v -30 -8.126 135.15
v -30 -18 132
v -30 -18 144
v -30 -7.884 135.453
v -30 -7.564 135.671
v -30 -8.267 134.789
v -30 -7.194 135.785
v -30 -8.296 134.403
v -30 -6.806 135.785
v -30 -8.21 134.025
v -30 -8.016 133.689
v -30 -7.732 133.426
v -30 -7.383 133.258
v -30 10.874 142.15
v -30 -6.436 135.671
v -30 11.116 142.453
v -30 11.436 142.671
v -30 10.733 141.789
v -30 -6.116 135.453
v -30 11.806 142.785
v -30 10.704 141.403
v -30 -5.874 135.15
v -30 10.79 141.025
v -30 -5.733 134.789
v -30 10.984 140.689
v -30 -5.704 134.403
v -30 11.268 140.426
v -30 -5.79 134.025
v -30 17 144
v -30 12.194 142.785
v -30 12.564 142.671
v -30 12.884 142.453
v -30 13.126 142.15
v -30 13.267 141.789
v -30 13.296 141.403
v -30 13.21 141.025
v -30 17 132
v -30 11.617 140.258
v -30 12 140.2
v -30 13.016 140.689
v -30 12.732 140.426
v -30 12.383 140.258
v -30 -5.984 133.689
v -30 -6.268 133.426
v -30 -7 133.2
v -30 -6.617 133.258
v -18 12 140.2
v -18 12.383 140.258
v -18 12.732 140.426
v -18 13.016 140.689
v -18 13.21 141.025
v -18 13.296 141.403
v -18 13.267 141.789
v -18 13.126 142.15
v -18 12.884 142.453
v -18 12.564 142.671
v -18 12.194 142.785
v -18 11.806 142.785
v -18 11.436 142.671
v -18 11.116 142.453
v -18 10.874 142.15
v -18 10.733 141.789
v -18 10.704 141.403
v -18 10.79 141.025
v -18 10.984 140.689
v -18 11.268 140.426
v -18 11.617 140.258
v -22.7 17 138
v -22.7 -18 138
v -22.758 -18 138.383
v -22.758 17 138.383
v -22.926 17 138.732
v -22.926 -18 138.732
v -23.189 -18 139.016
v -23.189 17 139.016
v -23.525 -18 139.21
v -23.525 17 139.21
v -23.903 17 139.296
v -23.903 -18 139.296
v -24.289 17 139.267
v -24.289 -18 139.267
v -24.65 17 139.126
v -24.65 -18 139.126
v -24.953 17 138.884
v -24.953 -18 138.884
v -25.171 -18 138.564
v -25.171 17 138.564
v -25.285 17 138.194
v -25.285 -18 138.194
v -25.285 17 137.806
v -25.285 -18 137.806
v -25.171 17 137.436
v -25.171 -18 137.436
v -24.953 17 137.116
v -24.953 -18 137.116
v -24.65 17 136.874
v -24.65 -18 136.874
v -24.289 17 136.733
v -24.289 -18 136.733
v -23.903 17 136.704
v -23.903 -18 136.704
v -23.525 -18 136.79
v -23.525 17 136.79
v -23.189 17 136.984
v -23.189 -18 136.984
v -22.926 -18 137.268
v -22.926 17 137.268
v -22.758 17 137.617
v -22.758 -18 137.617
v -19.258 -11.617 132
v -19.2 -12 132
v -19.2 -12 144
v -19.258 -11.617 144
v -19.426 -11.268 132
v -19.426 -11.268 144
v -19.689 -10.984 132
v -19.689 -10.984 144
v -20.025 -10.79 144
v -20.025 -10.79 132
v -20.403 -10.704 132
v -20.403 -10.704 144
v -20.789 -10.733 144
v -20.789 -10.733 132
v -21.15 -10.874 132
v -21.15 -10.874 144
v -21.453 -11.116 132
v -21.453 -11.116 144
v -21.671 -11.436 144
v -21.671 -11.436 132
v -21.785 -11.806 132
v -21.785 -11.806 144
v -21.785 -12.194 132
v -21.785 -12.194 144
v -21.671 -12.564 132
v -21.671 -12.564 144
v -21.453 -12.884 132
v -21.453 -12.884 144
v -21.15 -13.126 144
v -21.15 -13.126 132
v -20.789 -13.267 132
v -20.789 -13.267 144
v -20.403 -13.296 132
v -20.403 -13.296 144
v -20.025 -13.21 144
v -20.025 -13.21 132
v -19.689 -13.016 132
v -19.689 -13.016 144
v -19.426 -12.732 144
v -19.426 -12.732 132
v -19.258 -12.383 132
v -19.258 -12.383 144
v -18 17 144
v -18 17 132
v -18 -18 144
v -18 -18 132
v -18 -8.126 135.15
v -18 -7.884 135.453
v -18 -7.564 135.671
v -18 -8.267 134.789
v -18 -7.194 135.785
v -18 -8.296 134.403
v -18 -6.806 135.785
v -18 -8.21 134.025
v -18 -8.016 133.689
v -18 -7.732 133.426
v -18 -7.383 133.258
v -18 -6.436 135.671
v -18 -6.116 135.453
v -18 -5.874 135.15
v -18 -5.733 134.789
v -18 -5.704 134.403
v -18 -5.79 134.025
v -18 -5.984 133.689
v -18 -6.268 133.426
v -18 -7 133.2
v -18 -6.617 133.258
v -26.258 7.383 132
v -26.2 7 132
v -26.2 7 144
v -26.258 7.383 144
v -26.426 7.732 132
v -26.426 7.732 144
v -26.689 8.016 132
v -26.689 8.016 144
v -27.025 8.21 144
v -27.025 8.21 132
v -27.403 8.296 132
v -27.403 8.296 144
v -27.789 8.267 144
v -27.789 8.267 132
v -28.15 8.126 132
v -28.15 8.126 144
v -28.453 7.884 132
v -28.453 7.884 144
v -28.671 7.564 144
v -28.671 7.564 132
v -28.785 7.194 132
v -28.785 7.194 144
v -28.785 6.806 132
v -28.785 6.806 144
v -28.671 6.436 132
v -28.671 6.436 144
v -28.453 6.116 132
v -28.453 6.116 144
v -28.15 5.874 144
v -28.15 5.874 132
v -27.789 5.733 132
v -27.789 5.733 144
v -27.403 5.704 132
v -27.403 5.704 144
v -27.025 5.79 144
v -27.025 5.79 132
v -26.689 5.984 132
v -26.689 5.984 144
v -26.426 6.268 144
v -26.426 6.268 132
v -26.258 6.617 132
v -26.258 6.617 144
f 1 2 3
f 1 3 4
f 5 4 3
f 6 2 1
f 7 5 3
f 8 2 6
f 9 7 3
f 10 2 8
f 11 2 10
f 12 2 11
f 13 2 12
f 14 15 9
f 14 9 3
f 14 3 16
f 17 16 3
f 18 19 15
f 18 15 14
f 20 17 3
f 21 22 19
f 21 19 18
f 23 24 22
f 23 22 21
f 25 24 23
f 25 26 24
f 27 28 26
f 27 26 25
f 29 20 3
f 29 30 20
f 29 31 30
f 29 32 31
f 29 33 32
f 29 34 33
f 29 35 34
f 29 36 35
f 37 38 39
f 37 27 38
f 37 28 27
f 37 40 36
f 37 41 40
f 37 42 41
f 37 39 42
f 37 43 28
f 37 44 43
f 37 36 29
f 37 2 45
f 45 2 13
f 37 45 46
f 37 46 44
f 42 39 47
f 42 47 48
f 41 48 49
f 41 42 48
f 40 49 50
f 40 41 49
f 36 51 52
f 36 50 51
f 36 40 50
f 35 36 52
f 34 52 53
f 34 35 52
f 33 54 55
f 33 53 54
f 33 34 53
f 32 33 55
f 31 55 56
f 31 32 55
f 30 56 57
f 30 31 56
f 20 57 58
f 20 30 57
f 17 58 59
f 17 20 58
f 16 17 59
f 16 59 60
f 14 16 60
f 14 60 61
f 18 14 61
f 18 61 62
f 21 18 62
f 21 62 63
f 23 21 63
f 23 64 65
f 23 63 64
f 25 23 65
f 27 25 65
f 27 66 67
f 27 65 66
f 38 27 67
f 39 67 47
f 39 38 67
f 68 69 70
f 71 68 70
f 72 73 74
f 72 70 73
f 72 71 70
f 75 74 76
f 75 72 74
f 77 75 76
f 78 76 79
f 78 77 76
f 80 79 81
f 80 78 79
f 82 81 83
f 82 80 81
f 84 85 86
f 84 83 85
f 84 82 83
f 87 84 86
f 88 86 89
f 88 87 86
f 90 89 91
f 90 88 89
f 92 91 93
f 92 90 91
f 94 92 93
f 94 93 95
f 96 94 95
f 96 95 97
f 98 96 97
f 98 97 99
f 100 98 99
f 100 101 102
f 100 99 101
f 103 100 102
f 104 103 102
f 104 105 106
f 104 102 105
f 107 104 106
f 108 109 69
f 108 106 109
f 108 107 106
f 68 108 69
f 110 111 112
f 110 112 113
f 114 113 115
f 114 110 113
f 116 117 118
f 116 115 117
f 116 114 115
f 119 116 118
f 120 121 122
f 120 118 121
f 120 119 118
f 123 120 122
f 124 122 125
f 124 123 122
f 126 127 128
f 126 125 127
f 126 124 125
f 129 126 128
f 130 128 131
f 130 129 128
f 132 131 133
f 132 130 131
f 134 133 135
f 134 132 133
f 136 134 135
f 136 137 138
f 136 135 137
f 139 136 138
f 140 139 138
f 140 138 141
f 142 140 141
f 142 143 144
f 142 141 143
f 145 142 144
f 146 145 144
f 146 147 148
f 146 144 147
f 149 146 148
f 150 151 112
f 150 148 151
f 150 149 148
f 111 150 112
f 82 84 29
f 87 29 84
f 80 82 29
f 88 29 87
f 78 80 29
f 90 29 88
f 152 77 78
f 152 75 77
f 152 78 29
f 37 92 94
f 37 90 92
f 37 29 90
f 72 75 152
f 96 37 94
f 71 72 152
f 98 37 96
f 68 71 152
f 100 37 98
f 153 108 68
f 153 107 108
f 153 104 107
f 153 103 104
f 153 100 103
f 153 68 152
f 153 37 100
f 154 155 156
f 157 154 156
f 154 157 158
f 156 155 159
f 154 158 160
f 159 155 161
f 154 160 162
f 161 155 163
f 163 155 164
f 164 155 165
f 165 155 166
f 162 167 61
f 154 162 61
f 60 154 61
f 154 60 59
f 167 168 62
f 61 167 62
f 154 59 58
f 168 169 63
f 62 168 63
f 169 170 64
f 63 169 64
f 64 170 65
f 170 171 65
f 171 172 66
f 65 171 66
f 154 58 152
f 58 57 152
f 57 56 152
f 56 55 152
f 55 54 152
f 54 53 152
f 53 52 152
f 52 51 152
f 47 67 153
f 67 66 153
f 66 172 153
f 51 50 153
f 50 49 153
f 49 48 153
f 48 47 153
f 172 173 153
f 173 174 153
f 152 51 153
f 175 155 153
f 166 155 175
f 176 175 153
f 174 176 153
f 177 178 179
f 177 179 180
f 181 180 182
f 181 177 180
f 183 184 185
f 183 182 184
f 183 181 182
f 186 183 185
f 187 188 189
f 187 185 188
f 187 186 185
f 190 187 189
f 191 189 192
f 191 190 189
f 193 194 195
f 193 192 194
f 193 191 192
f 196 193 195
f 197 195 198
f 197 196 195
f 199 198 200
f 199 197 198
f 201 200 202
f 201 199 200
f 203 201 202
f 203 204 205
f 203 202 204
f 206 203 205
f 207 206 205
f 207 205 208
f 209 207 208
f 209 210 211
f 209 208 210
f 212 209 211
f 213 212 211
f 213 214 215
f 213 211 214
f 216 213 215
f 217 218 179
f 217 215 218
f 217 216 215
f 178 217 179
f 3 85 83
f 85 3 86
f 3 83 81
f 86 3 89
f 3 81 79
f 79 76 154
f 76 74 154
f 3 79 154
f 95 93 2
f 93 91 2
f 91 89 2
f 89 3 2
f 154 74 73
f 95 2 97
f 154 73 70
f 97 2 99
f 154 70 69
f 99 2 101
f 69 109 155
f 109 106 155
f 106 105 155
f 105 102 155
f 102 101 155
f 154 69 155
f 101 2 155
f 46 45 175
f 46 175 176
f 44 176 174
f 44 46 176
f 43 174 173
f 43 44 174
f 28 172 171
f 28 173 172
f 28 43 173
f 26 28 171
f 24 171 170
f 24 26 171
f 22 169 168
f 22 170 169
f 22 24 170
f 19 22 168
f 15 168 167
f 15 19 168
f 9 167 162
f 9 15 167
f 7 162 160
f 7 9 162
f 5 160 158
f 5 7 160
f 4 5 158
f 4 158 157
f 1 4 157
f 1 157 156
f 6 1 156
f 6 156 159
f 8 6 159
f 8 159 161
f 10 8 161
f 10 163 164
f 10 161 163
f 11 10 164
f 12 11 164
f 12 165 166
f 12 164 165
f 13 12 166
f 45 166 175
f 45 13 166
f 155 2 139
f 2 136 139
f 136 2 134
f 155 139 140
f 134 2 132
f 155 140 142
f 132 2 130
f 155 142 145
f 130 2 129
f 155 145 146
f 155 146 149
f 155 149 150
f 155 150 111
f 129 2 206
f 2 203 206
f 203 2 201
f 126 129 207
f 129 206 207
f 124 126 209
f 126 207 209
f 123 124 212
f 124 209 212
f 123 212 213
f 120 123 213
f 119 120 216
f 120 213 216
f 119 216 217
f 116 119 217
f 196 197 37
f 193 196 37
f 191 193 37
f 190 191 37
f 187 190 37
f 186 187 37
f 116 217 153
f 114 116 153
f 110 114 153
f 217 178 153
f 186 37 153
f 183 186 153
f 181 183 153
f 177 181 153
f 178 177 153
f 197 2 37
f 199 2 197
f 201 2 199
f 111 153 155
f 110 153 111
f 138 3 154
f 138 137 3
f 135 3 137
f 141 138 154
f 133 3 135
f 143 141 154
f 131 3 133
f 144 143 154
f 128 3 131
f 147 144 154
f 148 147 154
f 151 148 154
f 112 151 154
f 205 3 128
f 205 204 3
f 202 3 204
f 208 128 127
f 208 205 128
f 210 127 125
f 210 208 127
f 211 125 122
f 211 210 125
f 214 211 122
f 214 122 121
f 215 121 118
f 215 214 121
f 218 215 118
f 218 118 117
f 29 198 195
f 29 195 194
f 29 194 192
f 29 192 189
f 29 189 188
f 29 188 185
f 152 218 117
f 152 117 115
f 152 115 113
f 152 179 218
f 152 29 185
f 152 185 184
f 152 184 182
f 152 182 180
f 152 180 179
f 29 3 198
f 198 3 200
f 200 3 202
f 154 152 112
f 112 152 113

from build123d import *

# Parameters (mm, degrees)
CYLINDER024_R           = 1.3
CYLINDER024_DEPTH       = 40
CYLINDER024_PITCH_ANGLE = 90
CYLINDER023_R           = 1.3
CYLINDER023_DEPTH       = 40
CYLINDER023_PITCH_ANGLE = 90
CYLINDER022_R           = 1.3
CYLINDER022_DEPTH       = 70
CYLINDER022_ROLL_ANGLE  = 90
CYLINDER021_R           = 1.3
CYLINDER021_DEPTH       = 40
CYLINDER020_R           = 1.3
CYLINDER020_DEPTH       = 40
BOX017_W                = 12
BOX017_H                = 35
BOX017_DEPTH            = 12


with BuildPart() as cylinder105:
    # Cylinder024 → Cylinder024 (new body)
    with BuildSketch(Plane.XY):
        Circle(CYLINDER024_R)
    extrude(amount=CYLINDER024_DEPTH)


with BuildPart() as cylinder105_1:
    # Cylinder024 pitch: moved
    add(cylinder105.part.rotate(Axis((0, 0, 0), (0, 1, 0)), CYLINDER024_PITCH_ANGLE))


with BuildPart() as cylinder105_2:
    # Cylinder024 placement: moved
    add(cylinder105_1.part.moved(Location((-40, 12, 9.5))))


with BuildPart() as fusion007:
    # Cylinder023 → Cylinder023 (new body)
    with BuildSketch(Plane.XY):
        Circle(CYLINDER023_R)
    extrude(amount=CYLINDER023_DEPTH)


with BuildPart() as fusion007_1:
    # Cylinder023 pitch: moved
    add(fusion007.part.rotate(Axis((0, 0, 0), (0, 1, 0)), CYLINDER023_PITCH_ANGLE))


with BuildPart() as fusion007_2:
    # Cylinder023 placement: moved
    add(fusion007_1.part.moved(Location((-40, -7, 2.5))))

    # Fusion007: union Cylinder105
    add(cylinder105_2.part)


with BuildPart() as fusion008:
    # Cylinder022 → Cylinder022 (new body)
    with BuildSketch(Plane.XY):
        Circle(CYLINDER022_R)
    extrude(amount=CYLINDER022_DEPTH)


with BuildPart() as fusion008_1:
    # Cylinder022 roll: moved
    add(fusion008.part.rotate(Axis((0, 0, 0), (1, 0, 0)), CYLINDER022_ROLL_ANGLE))


with BuildPart() as fusion008_2:
    # Cylinder022 placement: moved
    add(fusion008_1.part.moved(Location((-24, 39, 6))))

    # Fusion008: union Fusion007
    add(fusion007_2.part)


with BuildPart() as fusion009:
    # Cylinder021 → Cylinder021 (new body)
    with BuildSketch(Plane(origin=(-27.5, 7, -15), x_dir=(1, 0, 0), z_dir=(0, 0, 1))):
        Circle(CYLINDER021_R)
    extrude(amount=CYLINDER021_DEPTH)

    # Fusion009: union Fusion008
    add(fusion008_2.part)


with BuildPart() as corner_block_holes:
    # Cylinder020 → Cylinder020 (new body)
    with BuildSketch(Plane(origin=(-20.5, -12, -15), x_dir=(1, 0, 0), z_dir=(0, 0, 1))):
        Circle(CYLINDER020_R)
    extrude(amount=CYLINDER020_DEPTH)

    # Fusion010: union Fusion009
    add(fusion009.part)


with BuildPart() as corner_block002:
    # Box017 → Box017 (new body)
    with BuildSketch(Plane(origin=(-30, -18, 0), x_dir=(1, 0, 0), z_dir=(0, 0, 1))):
        with Locations((6, 17.5)):
            Rectangle(BOX017_W, BOX017_H)
    extrude(amount=BOX017_DEPTH)

    # Cut010: cut corner-block-holes
    add(corner_block_holes.part, mode=Mode.SUBTRACT)


with BuildPart() as corner_block002_1:
    # Cut010 placement: moved
    add(corner_block002.part.moved(Location((0, 0, 132))))


solid = corner_block002_1.part
